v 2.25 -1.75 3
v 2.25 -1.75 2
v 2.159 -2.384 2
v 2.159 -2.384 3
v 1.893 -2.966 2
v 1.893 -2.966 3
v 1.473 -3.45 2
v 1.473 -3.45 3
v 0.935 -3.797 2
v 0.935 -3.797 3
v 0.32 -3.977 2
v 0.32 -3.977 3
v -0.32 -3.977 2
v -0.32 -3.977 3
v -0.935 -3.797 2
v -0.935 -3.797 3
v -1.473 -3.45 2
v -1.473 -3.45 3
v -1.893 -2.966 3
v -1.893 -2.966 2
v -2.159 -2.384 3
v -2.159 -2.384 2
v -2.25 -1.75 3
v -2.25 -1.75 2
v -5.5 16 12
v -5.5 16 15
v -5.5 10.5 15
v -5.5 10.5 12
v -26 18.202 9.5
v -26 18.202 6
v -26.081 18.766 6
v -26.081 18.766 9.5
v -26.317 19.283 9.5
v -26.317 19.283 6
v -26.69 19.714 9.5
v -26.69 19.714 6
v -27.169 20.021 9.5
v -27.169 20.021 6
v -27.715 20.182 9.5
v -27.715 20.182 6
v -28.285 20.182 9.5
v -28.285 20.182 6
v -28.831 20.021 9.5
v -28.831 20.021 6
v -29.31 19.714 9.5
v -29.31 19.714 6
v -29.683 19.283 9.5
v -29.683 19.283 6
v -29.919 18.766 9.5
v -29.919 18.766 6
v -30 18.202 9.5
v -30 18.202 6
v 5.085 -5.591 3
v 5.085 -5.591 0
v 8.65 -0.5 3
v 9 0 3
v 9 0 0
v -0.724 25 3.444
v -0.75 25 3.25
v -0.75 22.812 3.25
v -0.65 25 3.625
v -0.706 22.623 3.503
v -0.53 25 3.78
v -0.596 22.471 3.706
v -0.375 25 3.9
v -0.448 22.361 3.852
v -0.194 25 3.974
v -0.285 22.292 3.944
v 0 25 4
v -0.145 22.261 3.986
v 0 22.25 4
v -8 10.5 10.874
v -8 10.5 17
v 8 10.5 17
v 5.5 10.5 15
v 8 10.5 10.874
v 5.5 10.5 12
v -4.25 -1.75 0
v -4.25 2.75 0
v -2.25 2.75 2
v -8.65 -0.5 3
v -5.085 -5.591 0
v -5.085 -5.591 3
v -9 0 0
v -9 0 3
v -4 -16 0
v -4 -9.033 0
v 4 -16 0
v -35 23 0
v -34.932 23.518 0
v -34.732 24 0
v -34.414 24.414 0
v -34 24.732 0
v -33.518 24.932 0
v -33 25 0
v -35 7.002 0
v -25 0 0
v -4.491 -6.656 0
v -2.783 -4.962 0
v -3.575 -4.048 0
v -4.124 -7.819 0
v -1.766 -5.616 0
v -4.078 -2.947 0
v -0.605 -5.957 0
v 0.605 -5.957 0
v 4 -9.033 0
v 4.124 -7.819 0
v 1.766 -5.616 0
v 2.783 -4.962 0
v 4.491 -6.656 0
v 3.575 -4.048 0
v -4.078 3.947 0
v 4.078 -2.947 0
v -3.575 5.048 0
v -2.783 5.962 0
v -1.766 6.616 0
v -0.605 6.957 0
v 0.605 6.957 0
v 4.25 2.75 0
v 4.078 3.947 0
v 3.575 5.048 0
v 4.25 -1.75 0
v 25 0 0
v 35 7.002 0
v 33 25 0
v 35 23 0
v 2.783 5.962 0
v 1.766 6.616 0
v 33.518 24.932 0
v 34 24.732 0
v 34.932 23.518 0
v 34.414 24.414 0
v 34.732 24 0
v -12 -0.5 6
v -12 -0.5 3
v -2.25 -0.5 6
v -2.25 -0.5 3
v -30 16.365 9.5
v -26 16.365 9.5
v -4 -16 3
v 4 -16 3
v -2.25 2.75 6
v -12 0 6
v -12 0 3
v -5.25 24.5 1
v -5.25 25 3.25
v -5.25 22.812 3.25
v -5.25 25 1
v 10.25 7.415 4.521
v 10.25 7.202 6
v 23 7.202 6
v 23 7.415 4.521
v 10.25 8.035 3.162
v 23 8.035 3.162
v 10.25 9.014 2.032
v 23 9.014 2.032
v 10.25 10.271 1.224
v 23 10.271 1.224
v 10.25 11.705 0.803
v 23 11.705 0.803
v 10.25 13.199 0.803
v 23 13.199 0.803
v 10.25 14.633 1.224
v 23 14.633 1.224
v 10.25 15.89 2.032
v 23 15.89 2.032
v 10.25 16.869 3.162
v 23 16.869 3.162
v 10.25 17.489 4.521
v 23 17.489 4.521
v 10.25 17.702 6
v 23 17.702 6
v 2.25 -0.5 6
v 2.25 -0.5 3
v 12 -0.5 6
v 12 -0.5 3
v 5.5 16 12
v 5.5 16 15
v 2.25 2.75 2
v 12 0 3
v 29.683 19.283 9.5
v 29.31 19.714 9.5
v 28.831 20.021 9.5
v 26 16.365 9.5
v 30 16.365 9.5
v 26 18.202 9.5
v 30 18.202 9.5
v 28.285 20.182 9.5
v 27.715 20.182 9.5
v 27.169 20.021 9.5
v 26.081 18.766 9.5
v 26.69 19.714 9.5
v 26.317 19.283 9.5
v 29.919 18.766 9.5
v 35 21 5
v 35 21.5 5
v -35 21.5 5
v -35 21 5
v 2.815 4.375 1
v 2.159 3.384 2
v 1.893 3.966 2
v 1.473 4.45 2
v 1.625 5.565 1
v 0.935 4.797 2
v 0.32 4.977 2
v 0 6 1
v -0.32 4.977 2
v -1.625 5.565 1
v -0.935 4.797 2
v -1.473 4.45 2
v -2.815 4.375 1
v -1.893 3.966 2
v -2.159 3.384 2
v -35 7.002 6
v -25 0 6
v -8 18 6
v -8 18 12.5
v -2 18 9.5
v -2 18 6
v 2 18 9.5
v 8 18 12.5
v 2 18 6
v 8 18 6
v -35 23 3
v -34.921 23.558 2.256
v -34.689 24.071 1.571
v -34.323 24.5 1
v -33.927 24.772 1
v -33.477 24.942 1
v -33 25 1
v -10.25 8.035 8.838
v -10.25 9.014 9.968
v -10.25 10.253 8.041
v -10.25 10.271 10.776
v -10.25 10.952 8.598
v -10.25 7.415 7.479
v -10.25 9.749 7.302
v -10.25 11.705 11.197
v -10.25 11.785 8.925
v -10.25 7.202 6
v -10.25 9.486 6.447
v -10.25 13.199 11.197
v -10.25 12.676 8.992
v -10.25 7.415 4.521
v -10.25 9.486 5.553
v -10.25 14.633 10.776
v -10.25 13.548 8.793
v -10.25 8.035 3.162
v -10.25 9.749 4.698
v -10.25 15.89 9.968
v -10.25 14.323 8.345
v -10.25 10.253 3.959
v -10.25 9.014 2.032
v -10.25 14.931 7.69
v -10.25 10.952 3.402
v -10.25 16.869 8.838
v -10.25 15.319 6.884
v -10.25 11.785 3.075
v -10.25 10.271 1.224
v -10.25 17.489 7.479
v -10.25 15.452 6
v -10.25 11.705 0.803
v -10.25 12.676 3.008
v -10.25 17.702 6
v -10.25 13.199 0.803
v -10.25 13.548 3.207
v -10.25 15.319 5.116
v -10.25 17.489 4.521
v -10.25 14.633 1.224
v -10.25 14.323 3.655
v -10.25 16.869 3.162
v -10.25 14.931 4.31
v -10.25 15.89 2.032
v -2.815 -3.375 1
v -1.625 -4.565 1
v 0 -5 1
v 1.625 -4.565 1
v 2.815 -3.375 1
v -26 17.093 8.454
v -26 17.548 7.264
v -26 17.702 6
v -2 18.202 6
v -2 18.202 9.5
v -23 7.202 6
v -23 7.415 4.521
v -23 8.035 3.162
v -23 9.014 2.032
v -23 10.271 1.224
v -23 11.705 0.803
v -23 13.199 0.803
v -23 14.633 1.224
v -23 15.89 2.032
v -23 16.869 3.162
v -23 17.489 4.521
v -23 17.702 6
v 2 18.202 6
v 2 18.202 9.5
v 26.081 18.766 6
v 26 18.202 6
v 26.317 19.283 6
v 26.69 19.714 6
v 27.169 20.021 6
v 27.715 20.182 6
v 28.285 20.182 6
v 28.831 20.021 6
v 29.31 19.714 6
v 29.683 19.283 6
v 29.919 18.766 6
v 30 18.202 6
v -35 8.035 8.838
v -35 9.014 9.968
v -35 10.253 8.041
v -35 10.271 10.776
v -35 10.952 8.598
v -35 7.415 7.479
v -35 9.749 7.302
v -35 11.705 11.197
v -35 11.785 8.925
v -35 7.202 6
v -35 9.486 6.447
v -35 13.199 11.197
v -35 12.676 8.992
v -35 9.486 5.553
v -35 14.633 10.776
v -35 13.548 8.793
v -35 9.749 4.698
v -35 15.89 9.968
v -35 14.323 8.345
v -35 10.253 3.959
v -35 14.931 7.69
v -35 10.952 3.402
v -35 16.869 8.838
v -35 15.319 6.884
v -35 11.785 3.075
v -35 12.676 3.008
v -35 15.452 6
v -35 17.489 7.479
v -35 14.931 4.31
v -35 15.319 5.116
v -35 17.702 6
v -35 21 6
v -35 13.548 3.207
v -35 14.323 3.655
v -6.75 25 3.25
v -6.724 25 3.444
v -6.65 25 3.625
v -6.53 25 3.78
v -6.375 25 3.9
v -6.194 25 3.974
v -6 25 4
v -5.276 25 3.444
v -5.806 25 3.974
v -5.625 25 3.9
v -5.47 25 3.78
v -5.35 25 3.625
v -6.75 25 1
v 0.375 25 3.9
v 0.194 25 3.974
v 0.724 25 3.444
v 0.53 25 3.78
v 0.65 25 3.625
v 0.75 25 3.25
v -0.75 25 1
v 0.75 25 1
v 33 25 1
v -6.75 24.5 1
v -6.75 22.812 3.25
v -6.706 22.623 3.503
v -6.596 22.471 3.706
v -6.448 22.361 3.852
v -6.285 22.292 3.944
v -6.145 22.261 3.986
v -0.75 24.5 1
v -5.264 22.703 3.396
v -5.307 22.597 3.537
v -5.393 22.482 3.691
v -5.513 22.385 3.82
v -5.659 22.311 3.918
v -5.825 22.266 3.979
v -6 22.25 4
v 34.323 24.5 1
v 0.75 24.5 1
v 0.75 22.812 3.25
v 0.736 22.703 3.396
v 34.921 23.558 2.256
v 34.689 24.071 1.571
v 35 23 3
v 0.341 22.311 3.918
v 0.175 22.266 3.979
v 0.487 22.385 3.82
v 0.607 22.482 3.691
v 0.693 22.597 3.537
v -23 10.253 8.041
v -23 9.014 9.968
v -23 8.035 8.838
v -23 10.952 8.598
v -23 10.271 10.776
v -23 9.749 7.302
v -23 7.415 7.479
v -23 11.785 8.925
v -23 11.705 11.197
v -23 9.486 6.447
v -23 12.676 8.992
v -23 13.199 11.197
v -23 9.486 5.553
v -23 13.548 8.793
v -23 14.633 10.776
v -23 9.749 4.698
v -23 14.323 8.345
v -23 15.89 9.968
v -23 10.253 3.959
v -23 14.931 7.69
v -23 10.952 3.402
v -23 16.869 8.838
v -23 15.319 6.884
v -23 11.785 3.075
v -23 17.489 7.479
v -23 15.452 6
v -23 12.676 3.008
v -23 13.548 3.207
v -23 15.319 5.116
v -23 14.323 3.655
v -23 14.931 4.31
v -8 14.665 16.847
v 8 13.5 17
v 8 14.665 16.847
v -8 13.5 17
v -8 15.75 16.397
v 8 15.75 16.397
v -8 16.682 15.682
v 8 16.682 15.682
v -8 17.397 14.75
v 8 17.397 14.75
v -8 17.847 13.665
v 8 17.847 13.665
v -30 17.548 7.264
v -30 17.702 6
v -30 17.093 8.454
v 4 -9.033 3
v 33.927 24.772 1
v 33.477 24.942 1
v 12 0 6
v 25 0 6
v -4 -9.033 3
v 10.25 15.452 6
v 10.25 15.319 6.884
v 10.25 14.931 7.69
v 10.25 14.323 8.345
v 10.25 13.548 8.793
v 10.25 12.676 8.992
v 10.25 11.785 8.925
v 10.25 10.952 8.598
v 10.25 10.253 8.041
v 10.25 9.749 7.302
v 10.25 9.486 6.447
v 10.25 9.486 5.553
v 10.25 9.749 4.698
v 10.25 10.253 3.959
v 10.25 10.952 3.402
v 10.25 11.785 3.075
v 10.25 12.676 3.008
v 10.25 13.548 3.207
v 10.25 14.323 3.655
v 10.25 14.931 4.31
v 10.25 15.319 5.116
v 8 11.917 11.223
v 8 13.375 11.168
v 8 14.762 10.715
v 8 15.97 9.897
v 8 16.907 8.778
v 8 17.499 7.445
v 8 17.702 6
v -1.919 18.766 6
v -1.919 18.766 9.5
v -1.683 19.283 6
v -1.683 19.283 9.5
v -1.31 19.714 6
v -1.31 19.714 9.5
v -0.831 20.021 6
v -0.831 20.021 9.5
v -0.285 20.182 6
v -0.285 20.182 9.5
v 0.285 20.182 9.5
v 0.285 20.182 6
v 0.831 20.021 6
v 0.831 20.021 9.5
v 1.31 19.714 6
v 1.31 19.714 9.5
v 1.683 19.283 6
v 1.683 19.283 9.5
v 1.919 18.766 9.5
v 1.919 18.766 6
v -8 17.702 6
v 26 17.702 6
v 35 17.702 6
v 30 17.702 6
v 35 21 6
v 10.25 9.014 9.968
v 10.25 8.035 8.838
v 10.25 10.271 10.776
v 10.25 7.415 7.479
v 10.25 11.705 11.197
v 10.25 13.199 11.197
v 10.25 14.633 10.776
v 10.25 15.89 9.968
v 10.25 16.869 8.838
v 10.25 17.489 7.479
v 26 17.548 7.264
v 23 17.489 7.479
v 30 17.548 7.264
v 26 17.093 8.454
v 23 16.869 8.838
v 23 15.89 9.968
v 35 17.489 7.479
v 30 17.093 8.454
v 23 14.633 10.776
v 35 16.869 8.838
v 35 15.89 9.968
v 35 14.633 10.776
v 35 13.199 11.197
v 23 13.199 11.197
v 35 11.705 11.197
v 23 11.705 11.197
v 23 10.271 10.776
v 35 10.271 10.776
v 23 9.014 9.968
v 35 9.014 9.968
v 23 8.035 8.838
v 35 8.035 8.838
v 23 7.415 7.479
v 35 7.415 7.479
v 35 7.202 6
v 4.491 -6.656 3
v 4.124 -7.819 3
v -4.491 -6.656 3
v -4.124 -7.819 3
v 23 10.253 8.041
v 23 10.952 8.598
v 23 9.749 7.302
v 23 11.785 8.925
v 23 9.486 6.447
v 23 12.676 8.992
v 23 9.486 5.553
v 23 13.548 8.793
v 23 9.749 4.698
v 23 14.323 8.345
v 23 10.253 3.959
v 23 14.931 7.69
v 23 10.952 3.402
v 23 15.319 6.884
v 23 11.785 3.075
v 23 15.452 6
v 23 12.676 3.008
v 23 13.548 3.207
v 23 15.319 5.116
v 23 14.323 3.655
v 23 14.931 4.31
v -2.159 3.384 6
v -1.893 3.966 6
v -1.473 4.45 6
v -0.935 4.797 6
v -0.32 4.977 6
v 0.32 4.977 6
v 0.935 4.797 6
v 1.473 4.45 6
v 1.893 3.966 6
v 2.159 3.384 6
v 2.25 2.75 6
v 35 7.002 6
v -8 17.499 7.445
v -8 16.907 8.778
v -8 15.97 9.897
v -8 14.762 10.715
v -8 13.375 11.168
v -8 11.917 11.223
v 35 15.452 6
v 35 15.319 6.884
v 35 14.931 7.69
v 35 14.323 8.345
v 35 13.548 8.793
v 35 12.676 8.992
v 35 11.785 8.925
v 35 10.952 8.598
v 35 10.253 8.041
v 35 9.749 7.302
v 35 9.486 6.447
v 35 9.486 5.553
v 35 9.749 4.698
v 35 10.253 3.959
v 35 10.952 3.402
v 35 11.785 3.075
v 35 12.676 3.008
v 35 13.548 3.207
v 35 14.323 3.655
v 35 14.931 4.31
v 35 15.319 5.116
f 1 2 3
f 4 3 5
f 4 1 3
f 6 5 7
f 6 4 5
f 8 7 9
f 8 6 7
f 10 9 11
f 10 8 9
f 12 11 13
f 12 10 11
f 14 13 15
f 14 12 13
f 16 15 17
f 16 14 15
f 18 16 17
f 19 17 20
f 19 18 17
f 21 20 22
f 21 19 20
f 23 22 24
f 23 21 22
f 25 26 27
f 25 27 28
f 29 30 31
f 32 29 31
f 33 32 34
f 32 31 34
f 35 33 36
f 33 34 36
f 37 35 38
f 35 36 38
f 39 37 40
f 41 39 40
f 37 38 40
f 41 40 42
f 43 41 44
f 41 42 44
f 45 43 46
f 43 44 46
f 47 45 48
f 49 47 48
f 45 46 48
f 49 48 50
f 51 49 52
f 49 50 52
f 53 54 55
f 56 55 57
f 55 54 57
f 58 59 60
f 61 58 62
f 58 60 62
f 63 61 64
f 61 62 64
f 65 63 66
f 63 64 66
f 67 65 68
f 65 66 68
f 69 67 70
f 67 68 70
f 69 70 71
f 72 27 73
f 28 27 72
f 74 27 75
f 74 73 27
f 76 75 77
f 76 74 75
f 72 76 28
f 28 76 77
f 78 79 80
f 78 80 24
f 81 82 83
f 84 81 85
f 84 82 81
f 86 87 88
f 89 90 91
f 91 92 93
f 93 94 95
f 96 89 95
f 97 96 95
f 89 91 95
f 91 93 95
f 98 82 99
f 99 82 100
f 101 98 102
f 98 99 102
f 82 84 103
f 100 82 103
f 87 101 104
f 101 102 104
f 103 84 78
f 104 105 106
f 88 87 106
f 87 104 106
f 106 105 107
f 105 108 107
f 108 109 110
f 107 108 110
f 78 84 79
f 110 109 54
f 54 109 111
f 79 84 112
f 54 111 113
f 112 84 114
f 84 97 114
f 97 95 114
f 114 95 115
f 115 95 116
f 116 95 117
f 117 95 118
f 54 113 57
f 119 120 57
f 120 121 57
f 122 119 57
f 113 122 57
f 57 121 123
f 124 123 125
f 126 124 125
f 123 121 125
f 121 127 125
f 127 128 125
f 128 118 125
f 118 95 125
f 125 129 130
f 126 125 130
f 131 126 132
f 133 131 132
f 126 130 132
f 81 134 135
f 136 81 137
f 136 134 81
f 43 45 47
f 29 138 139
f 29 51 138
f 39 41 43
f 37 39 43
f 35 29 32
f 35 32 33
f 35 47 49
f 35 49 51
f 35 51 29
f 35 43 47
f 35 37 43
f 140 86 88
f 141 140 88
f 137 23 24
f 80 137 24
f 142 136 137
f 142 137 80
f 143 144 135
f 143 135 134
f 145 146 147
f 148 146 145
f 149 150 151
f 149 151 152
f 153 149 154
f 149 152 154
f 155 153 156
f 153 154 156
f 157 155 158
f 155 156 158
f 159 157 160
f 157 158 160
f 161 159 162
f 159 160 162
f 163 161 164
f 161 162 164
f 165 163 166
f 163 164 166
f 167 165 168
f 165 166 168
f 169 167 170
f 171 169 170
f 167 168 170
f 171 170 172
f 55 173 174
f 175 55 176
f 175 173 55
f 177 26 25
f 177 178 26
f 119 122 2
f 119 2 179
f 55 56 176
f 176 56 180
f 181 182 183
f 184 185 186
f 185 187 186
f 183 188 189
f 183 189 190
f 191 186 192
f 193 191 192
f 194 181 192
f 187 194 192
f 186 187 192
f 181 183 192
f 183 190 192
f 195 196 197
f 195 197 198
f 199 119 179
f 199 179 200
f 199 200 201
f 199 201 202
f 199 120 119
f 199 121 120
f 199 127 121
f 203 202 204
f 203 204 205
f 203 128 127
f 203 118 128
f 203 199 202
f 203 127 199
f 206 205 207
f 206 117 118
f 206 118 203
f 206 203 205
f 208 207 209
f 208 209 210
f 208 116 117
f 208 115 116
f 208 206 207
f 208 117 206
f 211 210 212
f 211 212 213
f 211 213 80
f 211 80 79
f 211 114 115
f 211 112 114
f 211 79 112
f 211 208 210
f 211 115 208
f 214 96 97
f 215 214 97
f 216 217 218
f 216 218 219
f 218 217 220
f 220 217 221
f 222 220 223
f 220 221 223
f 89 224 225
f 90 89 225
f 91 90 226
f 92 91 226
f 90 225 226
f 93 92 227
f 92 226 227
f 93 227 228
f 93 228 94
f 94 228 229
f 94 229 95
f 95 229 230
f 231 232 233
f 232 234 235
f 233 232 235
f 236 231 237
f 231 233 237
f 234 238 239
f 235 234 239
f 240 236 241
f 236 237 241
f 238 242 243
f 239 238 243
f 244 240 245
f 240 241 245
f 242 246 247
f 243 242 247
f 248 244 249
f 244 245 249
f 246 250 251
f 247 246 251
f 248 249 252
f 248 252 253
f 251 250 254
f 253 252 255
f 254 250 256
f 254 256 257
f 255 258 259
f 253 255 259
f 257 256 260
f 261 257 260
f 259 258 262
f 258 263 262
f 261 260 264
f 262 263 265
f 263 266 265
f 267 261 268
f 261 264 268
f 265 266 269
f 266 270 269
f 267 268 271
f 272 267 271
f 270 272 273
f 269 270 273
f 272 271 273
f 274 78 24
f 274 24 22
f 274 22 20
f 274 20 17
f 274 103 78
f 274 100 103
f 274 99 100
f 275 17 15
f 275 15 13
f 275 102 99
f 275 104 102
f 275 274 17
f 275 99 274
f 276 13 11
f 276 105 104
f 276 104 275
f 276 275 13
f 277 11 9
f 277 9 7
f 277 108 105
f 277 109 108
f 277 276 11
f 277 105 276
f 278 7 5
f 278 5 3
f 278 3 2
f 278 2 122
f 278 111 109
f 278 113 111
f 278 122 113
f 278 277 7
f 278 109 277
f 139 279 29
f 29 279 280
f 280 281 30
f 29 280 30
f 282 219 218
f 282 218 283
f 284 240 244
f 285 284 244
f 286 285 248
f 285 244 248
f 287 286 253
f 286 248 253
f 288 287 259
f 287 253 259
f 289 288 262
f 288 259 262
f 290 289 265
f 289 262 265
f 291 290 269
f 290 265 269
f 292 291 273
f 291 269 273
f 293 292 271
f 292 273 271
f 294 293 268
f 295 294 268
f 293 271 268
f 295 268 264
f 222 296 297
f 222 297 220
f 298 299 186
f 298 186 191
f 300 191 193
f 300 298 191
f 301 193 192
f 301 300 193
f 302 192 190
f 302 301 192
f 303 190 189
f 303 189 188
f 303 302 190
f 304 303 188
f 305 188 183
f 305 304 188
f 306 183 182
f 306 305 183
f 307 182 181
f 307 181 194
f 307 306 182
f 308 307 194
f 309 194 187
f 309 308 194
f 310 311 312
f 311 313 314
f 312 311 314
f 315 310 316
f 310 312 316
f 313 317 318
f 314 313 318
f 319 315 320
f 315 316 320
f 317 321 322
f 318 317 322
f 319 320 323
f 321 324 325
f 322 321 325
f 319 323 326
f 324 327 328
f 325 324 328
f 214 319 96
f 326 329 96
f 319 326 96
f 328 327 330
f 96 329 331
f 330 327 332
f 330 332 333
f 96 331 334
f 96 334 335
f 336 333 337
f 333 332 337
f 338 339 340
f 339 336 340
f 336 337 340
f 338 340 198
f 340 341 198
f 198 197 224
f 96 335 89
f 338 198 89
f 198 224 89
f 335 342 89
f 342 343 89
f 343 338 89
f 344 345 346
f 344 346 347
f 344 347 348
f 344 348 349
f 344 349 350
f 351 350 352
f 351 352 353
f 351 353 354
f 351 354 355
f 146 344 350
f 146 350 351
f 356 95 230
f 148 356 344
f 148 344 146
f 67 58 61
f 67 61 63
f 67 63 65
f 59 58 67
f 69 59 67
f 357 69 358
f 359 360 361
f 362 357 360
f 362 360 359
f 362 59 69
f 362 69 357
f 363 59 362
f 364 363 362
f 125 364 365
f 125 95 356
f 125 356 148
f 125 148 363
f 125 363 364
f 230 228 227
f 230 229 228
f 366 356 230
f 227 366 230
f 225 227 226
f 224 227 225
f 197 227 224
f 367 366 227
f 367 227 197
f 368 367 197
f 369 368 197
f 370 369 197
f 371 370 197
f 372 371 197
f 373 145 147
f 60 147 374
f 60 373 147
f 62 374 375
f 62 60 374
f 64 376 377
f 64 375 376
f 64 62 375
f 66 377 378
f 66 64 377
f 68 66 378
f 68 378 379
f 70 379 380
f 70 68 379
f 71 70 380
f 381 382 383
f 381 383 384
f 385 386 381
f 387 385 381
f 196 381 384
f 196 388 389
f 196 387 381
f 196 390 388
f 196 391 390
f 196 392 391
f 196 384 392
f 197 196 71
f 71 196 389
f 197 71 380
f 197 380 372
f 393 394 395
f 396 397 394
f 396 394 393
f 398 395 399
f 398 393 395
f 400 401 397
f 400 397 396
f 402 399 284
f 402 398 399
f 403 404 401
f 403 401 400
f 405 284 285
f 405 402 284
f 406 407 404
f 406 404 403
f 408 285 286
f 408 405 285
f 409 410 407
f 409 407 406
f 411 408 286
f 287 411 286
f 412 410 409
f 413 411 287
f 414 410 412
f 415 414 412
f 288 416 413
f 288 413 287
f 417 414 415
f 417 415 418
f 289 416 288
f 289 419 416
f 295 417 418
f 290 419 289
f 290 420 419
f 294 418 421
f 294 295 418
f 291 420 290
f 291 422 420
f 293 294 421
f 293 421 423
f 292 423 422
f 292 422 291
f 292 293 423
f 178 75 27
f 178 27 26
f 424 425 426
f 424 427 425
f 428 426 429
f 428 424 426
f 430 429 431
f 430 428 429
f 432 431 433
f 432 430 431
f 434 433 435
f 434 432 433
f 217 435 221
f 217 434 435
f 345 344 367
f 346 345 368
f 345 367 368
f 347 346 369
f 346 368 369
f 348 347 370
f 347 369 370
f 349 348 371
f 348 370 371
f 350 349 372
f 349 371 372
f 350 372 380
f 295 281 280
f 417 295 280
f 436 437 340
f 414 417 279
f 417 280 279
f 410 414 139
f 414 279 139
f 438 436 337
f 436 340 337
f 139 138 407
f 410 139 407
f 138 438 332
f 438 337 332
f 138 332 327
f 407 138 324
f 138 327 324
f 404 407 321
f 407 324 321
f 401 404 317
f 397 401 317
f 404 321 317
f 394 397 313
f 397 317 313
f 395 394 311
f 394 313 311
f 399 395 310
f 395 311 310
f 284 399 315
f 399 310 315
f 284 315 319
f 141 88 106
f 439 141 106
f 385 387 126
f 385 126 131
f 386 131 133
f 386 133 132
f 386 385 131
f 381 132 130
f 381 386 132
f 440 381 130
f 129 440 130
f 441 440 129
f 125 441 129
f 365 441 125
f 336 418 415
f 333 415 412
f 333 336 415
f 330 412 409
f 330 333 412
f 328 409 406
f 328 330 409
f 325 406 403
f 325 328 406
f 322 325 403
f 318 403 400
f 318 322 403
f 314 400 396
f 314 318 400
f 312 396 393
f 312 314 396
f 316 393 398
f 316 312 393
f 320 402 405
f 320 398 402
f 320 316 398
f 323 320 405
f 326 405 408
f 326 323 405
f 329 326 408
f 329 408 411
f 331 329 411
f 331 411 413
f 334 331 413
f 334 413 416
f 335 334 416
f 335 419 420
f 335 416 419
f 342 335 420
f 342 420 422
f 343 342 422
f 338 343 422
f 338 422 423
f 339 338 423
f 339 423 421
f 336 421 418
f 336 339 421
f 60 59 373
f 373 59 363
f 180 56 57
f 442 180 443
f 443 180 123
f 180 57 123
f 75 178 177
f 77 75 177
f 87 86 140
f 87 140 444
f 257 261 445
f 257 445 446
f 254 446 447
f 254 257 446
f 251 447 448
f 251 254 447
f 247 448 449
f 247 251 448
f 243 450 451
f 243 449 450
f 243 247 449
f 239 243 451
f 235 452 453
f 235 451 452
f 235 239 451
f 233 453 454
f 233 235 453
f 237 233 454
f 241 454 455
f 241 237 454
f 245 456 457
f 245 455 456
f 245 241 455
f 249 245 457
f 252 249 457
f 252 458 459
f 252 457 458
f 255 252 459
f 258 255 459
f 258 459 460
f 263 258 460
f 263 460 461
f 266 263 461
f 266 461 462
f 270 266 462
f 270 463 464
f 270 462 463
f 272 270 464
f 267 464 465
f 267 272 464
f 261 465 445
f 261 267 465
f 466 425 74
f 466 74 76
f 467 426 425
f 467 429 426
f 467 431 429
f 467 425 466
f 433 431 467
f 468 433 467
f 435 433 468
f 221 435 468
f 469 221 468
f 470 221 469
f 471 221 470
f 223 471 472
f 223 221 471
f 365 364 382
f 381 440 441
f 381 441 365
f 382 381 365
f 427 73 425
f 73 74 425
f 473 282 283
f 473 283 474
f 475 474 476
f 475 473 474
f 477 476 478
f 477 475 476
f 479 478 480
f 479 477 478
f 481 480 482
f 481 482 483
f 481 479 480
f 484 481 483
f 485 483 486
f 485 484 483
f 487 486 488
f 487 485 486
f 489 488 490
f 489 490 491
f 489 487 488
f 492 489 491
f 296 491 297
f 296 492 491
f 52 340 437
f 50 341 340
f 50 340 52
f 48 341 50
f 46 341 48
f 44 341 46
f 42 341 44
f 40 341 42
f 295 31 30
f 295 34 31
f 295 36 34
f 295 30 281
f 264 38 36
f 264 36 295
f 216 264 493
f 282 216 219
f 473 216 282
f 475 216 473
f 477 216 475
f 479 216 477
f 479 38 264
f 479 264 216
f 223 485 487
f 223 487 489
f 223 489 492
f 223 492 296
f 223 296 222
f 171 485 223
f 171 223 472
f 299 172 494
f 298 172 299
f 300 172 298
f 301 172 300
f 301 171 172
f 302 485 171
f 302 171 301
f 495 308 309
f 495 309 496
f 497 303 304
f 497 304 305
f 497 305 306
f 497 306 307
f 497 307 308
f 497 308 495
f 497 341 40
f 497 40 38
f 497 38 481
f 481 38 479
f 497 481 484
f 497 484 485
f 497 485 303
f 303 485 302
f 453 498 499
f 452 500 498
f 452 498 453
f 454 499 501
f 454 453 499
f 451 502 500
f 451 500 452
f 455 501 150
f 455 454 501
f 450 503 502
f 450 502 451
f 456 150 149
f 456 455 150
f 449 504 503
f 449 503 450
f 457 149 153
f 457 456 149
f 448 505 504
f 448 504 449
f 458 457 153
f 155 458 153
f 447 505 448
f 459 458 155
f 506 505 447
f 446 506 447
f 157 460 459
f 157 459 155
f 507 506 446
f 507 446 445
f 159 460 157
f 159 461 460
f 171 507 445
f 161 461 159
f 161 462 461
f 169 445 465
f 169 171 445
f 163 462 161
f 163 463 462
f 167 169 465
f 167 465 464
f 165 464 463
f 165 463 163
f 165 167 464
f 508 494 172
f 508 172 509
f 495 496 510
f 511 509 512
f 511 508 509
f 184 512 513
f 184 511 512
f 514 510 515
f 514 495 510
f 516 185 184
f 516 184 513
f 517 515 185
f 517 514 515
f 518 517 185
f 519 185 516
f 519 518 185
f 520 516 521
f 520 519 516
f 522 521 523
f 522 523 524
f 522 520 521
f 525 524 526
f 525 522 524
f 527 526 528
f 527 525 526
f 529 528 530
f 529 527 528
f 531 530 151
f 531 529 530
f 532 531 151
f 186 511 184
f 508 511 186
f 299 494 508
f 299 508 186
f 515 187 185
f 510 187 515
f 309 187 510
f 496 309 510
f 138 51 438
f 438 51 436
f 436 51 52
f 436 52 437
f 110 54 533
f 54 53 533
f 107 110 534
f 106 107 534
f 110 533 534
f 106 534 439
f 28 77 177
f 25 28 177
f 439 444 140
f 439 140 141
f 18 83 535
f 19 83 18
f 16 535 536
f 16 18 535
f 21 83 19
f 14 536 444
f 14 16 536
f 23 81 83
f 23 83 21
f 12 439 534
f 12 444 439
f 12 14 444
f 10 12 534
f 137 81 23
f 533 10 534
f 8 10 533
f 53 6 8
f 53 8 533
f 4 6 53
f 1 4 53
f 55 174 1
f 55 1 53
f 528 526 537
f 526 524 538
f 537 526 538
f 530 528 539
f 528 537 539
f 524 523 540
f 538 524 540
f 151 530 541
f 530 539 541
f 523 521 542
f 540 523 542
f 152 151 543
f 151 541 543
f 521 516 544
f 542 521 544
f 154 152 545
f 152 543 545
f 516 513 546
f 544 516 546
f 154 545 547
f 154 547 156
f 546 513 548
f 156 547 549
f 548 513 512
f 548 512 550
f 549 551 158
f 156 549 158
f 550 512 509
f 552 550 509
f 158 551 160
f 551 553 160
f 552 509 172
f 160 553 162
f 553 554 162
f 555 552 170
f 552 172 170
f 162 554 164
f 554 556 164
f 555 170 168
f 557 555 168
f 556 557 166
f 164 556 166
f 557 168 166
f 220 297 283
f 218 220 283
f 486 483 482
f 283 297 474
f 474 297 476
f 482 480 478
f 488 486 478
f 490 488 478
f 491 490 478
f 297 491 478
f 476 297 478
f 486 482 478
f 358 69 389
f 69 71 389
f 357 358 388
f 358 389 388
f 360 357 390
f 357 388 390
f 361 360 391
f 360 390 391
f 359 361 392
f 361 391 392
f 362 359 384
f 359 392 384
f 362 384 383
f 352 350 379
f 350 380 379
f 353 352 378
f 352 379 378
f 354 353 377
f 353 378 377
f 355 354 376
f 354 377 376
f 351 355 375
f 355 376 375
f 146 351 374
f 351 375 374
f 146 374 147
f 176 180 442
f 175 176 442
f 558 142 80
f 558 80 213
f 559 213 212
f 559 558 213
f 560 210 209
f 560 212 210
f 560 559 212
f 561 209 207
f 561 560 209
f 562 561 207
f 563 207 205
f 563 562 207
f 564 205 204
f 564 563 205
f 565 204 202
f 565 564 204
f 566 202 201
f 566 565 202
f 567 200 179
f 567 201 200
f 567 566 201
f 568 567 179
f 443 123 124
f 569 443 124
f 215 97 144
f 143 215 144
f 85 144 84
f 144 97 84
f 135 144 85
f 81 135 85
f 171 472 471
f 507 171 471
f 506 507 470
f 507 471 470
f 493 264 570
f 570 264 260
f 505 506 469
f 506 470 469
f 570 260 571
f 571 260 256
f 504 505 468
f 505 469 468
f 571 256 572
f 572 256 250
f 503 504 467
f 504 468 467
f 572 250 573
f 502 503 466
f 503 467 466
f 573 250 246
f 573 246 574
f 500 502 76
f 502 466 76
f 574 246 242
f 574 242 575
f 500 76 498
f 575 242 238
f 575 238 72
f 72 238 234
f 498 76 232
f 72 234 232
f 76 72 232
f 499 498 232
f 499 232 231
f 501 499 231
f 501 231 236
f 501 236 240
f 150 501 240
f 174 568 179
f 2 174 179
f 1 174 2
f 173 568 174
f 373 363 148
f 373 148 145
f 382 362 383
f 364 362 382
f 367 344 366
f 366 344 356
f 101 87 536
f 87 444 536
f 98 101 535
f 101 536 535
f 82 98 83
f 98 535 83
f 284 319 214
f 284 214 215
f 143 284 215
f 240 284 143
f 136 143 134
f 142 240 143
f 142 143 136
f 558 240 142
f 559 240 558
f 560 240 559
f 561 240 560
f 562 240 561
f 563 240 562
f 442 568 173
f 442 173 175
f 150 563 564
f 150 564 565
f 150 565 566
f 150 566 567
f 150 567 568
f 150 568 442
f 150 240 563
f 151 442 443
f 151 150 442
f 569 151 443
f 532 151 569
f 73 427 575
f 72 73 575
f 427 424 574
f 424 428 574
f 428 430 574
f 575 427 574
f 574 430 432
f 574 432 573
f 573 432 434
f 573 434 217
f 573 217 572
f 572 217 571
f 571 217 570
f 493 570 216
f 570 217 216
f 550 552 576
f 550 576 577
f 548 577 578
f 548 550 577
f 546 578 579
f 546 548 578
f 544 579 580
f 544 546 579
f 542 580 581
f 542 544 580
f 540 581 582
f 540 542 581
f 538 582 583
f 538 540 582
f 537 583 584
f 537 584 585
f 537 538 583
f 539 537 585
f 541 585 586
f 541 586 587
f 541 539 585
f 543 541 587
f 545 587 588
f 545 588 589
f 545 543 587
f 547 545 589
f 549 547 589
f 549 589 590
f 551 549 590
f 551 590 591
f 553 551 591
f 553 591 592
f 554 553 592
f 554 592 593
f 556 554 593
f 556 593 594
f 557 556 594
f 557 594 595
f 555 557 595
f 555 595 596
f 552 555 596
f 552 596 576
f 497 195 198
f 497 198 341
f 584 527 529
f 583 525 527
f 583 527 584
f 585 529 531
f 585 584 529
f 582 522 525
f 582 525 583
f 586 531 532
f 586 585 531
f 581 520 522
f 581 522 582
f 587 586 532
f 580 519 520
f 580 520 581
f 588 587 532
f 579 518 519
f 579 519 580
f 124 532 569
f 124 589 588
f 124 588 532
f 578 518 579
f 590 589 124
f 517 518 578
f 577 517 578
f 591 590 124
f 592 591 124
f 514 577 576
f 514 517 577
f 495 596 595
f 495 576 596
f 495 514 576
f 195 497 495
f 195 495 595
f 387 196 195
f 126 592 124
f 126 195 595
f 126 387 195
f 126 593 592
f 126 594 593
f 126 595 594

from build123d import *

# Parameters (mm, degrees)
BOSS_EXTRUDE1_DEPTH = 6
SKETCH2_R           = 5.25
CUT_EXTRUDE1_DEPTH  = 88
SKETCH2_2_R         = 5.25
BOSS_EXTRUDE2_DEPTH = 12
BOSS_EXTRUDE3_START = -24.75
SKETCH2_3_R         = 5.25
BOSS_EXTRUDE3_DEPTH = 10.25
SKETCH3_W           = 4
SKETCH3_H           = 8.859259966
BOSS_EXTRUDE4_DEPTH = 3
BOSS_EXTRUDE5_DEPTH = 3.5
CUT_EXTRUDE2_DEPTH  = 84.5
SKETCH14_W          = 24
SKETCH14_H          = 3
BOSS_EXTRUDE9_DEPTH = 0.5
BOSS_EXTRUDE7_DEPTH = 3.5
SKETCH12_W          = 11
SKETCH12_H          = 7.5
BOSS_EXTRUDE8_DEPTH = 8
SKETCH13_W          = 3
SKETCH13_H          = 5.5
CUT_EXTRUDE5_DEPTH  = 5.5
FILLET6_R           = 4.5
HOLE1_START         = -35
HOLE1_OUTLINE_R     = 3
HOLE1_DEPTH         = 70
CUT_EXTRUDE3_DEPTH  = 84.5
CHAMFER1_SIZE       = 2
FILLET3_R           = 2
BOSS_EXTRUDE6_REACH = 58.524
SKETCH9_W           = 1.5
SKETCH9_H           = 4
FILLET4_R           = 0.75
FILLET5_R           = 6


# Read off the part's stored shape, not the designer's step: Hole1
with BuildPart() as part:
    # Sketch1 → Boss-Extrude1 (new body)
    with BuildSketch(Plane.XY):
        Polygon((-25, 0), (25, 0), (35, 7.002075382), (35, 25), (-35, 25), (-35, 7.002075382), align=None)
    extrude(amount=BOSS_EXTRUDE1_DEPTH)

    # Sketch2 → Cut-Extrude1 (cut)
    with BuildSketch(Plane(origin=(35, 0, 0), x_dir=(0, 0, -1), z_dir=(1, 0, 0))):
        with Locations((-6, 12.452075382)):
            Circle(SKETCH2_R)
    extrude(amount=-CUT_EXTRUDE1_DEPTH, mode=Mode.SUBTRACT)

    # Sketch2<2> → Boss-Extrude2 (add)
    with BuildSketch(Plane(origin=(35, 0, 0), x_dir=(0, 0, -1), z_dir=(1, 0, 0))):
        with Locations((-6, 12.452075382)):
            Circle(SKETCH2_2_R)
    boss_extrude2 = extrude(amount=-BOSS_EXTRUDE2_DEPTH)

    # Sketch2<3> → Boss-Extrude3 (add)
    with BuildSketch(Plane(origin=(35, 0, 0), x_dir=(0, 0, -1), z_dir=(1, 0, 0)).offset(BOSS_EXTRUDE3_START)):
        with Locations((-6, 12.452075382)):
            Circle(SKETCH2_3_R)
    boss_extrude3 = extrude(amount=-BOSS_EXTRUDE3_DEPTH)

    # Sketch3 → Boss-Extrude4 (add)
    with BuildSketch(Plane(origin=(0, 0, 0), x_dir=(-1, 0, 0), z_dir=(0, 0, -1))):
        with Locations((2, -11.570370017)):
            Rectangle(SKETCH3_W, SKETCH3_H)
        Polygon((0, -7.140740034), (4, -7.140740034), (9, 0), (0, 0), align=None)
    boss_extrude4 = extrude(amount=-BOSS_EXTRUDE4_DEPTH)

    # Sketch4 → Boss-Extrude5 (add)
    with BuildSketch(Plane.XY.offset(6)):
        with BuildLine():
            Line((26, 10.749226565), (26, 18.202075382))
            ThreePointArc((26, 18.202075382), (28, 20.202075382), (30, 18.202075382))
            Line((30, 18.202075382), (30, 10.749226565))
            ThreePointArc((30, 10.749226565), (28, 8.749226565), (26, 10.749226565))
        make_face()
    boss_extrude5 = extrude(amount=BOSS_EXTRUDE5_DEPTH)

    # Sketch5 → Cut-Extrude2 (cut)
    with BuildSketch(Plane(origin=(35, 0, 0), x_dir=(0, 0, -1), z_dir=(1, 0, 0))):
        Polygon((-1, 25), (-1, 24.5), (-5, 21.5), (-5, 21), (-6, 21), (-6, 25), align=None)
    extrude(amount=-CUT_EXTRUDE2_DEPTH, mode=Mode.SUBTRACT)

    # Mirror2: Boss-Extrude2, Boss-Extrude3, Boss-Extrude4, Boss-Extrude5 across plane
    add(boss_extrude2.mirror(Plane(origin=(0, 0, 3), x_dir=(0, 0, 1), z_dir=(-1, 0, 0))))
    add(boss_extrude3.mirror(Plane(origin=(0, 0, 3), x_dir=(0, 0, 1), z_dir=(-1, 0, 0))))
    add(boss_extrude4.mirror(Plane(origin=(0, 0, 3), x_dir=(0, 0, 1), z_dir=(-1, 0, 0))))
    add(boss_extrude5.mirror(Plane(origin=(0, 0, 3), x_dir=(0, 0, 1), z_dir=(-1, 0, 0))))

    # Sketch14 → Boss-Extrude9 (add)
    with BuildSketch(Plane.XZ):
        with Locations((0, 4.5)):
            Rectangle(SKETCH14_W, SKETCH14_H)
    extrude(amount=BOSS_EXTRUDE9_DEPTH)

    # Sketch10 → Boss-Extrude7 (add)
    with BuildSketch(Plane.XY.offset(6)):
        with BuildLine():
            Line((-2, 12.452075382), (-2, 18.202075382))
            ThreePointArc((-2, 18.202075382), (0, 20.202075382), (2, 18.202075382))
            Line((2, 18.202075382), (2, 12.452075382))
            ThreePointArc((2, 12.452075382), (0, 10.452075382), (-2, 12.452075382))
        make_face()
    extrude(amount=BOSS_EXTRUDE7_DEPTH)

    # Sketch12 → Boss-Extrude8 (add, symmetric)
    with BuildSketch(Plane(origin=(0, 0, 0), x_dir=(0, 0, -1), z_dir=(1, 0, 0))):
        with Locations((-11.5, 14.25)):
            Rectangle(SKETCH12_W, SKETCH12_H)
    extrude(amount=BOSS_EXTRUDE8_DEPTH, both=True)

    # Sketch13 → Cut-Extrude5 (cut, symmetric)
    with BuildSketch(Plane(origin=(0, 0, 0), x_dir=(0, 0, -1), z_dir=(1, 0, 0))):
        with Locations((-13.5, 13.25)):
            Rectangle(SKETCH13_W, SKETCH13_H)
    extrude(amount=CUT_EXTRUDE5_DEPTH, both=True, mode=Mode.SUBTRACT)

    # Fillet6
    fillet6_edges = [part.edges().sort_by_distance(p)[0] for p in [
        (0, 18, 17),
    ]]
    fillet(fillet6_edges, radius=FILLET6_R)

    # Hole1 outline → Hole1 (cut)
    with BuildSketch(Plane.YZ.offset(HOLE1_START)):
        with Locations((12.452075382, 6)):
            Circle(HOLE1_OUTLINE_R)
    extrude(amount=HOLE1_DEPTH, mode=Mode.SUBTRACT)

    # Sketch7 → Cut-Extrude3 (cut)
    with BuildSketch(Plane.XY.offset(6)):
        with BuildLine():
            Line((-2.25, -1.75), (-2.25, 2.75))
            ThreePointArc((-2.25, 2.75), (0, 5), (2.25, 2.75))
            Line((2.25, 2.75), (2.25, -1.75))
            ThreePointArc((2.25, -1.75), (0, -4), (-2.25, -1.75))
        make_face()
    extrude(amount=-CUT_EXTRUDE3_DEPTH, mode=Mode.SUBTRACT)

    # Chamfer1
    chamfer1_edges = [part.edges().sort_by_distance(p)[0] for p in [
        (0, 5, 0),
        (0, -4, 0),
        (-2.25, 0.5, 0),
        (2.25, 0.5, 0),
    ]]
    chamfer(chamfer1_edges, length=CHAMFER1_SIZE)

    # Fillet3
    fillet3_edges = [part.edges().sort_by_distance(p)[0] for p in [
        (-35, 25, 0.5),
        (35, 25, 0.5),
    ]]
    fillet(fillet3_edges, radius=FILLET3_R)

    # Boss-Extrude6: up to this face of the body (flat: up to its plane)
    boss_extrude6_end = Plane(part.part.faces().sort_by_distance((0, 22.996608877, 3.004521497))[0])
    # Sketch9 → Boss-Extrude6 (add, up to the picked face)
    with BuildSketch(Plane(origin=(0, 25, 0), x_dir=(1, 0, 0), z_dir=(0, 1, 0)), mode=Mode.PRIVATE) as boss_extrude6_sk1:
        with Locations((0, -2)):
            Rectangle(SKETCH9_W, SKETCH9_H)
    boss_extrude6_tool1 = split(extrude(boss_extrude6_sk1.sketch, amount=-BOSS_EXTRUDE6_REACH, mode=Mode.PRIVATE), bisect_by=boss_extrude6_end, keep=Keep.BOTH, mode=Mode.PRIVATE)
    # Sketch9 → Boss-Extrude6 (add, up to the picked face)
    with BuildSketch(Plane(origin=(0, 25, 0), x_dir=(1, 0, 0), z_dir=(0, 1, 0)), mode=Mode.PRIVATE) as boss_extrude6_sk2:
        with Locations((-6, -2)):
            Rectangle(SKETCH9_W, SKETCH9_H)
    boss_extrude6_tool2 = split(extrude(boss_extrude6_sk2.sketch, amount=-BOSS_EXTRUDE6_REACH, mode=Mode.PRIVATE), bisect_by=boss_extrude6_end, keep=Keep.BOTH, mode=Mode.PRIVATE)
    add(boss_extrude6_tool1.solids().sort_by(Axis((0, 25, 2), (0, -1, 0)))[0])
    add(boss_extrude6_tool2.solids().sort_by(Axis((-6, 25, 2), (0, -1, 0)))[0])

    # Fillet4
    fillet4_edges = [part.edges().sort_by_distance(p)[0] for p in [
        (-6.75, 23.625, 4),
        (-5.25, 23.625, 4),
        (-0.75, 23.625, 4),
        (0.75, 23.625, 4),
    ]]
    fillet(fillet4_edges, radius=FILLET4_R - 0.0001)  # a hair under: the kernel refuses the full size

    # Fillet5
    fillet5_edges = [part.edges().sort_by_distance(p)[0] for p in [
        (4, -7.140740034, 1.5),
        (-4, -7.140740034, 1.5),
    ]]
    fillet(fillet5_edges, radius=FILLET5_R)


solid = part.part
